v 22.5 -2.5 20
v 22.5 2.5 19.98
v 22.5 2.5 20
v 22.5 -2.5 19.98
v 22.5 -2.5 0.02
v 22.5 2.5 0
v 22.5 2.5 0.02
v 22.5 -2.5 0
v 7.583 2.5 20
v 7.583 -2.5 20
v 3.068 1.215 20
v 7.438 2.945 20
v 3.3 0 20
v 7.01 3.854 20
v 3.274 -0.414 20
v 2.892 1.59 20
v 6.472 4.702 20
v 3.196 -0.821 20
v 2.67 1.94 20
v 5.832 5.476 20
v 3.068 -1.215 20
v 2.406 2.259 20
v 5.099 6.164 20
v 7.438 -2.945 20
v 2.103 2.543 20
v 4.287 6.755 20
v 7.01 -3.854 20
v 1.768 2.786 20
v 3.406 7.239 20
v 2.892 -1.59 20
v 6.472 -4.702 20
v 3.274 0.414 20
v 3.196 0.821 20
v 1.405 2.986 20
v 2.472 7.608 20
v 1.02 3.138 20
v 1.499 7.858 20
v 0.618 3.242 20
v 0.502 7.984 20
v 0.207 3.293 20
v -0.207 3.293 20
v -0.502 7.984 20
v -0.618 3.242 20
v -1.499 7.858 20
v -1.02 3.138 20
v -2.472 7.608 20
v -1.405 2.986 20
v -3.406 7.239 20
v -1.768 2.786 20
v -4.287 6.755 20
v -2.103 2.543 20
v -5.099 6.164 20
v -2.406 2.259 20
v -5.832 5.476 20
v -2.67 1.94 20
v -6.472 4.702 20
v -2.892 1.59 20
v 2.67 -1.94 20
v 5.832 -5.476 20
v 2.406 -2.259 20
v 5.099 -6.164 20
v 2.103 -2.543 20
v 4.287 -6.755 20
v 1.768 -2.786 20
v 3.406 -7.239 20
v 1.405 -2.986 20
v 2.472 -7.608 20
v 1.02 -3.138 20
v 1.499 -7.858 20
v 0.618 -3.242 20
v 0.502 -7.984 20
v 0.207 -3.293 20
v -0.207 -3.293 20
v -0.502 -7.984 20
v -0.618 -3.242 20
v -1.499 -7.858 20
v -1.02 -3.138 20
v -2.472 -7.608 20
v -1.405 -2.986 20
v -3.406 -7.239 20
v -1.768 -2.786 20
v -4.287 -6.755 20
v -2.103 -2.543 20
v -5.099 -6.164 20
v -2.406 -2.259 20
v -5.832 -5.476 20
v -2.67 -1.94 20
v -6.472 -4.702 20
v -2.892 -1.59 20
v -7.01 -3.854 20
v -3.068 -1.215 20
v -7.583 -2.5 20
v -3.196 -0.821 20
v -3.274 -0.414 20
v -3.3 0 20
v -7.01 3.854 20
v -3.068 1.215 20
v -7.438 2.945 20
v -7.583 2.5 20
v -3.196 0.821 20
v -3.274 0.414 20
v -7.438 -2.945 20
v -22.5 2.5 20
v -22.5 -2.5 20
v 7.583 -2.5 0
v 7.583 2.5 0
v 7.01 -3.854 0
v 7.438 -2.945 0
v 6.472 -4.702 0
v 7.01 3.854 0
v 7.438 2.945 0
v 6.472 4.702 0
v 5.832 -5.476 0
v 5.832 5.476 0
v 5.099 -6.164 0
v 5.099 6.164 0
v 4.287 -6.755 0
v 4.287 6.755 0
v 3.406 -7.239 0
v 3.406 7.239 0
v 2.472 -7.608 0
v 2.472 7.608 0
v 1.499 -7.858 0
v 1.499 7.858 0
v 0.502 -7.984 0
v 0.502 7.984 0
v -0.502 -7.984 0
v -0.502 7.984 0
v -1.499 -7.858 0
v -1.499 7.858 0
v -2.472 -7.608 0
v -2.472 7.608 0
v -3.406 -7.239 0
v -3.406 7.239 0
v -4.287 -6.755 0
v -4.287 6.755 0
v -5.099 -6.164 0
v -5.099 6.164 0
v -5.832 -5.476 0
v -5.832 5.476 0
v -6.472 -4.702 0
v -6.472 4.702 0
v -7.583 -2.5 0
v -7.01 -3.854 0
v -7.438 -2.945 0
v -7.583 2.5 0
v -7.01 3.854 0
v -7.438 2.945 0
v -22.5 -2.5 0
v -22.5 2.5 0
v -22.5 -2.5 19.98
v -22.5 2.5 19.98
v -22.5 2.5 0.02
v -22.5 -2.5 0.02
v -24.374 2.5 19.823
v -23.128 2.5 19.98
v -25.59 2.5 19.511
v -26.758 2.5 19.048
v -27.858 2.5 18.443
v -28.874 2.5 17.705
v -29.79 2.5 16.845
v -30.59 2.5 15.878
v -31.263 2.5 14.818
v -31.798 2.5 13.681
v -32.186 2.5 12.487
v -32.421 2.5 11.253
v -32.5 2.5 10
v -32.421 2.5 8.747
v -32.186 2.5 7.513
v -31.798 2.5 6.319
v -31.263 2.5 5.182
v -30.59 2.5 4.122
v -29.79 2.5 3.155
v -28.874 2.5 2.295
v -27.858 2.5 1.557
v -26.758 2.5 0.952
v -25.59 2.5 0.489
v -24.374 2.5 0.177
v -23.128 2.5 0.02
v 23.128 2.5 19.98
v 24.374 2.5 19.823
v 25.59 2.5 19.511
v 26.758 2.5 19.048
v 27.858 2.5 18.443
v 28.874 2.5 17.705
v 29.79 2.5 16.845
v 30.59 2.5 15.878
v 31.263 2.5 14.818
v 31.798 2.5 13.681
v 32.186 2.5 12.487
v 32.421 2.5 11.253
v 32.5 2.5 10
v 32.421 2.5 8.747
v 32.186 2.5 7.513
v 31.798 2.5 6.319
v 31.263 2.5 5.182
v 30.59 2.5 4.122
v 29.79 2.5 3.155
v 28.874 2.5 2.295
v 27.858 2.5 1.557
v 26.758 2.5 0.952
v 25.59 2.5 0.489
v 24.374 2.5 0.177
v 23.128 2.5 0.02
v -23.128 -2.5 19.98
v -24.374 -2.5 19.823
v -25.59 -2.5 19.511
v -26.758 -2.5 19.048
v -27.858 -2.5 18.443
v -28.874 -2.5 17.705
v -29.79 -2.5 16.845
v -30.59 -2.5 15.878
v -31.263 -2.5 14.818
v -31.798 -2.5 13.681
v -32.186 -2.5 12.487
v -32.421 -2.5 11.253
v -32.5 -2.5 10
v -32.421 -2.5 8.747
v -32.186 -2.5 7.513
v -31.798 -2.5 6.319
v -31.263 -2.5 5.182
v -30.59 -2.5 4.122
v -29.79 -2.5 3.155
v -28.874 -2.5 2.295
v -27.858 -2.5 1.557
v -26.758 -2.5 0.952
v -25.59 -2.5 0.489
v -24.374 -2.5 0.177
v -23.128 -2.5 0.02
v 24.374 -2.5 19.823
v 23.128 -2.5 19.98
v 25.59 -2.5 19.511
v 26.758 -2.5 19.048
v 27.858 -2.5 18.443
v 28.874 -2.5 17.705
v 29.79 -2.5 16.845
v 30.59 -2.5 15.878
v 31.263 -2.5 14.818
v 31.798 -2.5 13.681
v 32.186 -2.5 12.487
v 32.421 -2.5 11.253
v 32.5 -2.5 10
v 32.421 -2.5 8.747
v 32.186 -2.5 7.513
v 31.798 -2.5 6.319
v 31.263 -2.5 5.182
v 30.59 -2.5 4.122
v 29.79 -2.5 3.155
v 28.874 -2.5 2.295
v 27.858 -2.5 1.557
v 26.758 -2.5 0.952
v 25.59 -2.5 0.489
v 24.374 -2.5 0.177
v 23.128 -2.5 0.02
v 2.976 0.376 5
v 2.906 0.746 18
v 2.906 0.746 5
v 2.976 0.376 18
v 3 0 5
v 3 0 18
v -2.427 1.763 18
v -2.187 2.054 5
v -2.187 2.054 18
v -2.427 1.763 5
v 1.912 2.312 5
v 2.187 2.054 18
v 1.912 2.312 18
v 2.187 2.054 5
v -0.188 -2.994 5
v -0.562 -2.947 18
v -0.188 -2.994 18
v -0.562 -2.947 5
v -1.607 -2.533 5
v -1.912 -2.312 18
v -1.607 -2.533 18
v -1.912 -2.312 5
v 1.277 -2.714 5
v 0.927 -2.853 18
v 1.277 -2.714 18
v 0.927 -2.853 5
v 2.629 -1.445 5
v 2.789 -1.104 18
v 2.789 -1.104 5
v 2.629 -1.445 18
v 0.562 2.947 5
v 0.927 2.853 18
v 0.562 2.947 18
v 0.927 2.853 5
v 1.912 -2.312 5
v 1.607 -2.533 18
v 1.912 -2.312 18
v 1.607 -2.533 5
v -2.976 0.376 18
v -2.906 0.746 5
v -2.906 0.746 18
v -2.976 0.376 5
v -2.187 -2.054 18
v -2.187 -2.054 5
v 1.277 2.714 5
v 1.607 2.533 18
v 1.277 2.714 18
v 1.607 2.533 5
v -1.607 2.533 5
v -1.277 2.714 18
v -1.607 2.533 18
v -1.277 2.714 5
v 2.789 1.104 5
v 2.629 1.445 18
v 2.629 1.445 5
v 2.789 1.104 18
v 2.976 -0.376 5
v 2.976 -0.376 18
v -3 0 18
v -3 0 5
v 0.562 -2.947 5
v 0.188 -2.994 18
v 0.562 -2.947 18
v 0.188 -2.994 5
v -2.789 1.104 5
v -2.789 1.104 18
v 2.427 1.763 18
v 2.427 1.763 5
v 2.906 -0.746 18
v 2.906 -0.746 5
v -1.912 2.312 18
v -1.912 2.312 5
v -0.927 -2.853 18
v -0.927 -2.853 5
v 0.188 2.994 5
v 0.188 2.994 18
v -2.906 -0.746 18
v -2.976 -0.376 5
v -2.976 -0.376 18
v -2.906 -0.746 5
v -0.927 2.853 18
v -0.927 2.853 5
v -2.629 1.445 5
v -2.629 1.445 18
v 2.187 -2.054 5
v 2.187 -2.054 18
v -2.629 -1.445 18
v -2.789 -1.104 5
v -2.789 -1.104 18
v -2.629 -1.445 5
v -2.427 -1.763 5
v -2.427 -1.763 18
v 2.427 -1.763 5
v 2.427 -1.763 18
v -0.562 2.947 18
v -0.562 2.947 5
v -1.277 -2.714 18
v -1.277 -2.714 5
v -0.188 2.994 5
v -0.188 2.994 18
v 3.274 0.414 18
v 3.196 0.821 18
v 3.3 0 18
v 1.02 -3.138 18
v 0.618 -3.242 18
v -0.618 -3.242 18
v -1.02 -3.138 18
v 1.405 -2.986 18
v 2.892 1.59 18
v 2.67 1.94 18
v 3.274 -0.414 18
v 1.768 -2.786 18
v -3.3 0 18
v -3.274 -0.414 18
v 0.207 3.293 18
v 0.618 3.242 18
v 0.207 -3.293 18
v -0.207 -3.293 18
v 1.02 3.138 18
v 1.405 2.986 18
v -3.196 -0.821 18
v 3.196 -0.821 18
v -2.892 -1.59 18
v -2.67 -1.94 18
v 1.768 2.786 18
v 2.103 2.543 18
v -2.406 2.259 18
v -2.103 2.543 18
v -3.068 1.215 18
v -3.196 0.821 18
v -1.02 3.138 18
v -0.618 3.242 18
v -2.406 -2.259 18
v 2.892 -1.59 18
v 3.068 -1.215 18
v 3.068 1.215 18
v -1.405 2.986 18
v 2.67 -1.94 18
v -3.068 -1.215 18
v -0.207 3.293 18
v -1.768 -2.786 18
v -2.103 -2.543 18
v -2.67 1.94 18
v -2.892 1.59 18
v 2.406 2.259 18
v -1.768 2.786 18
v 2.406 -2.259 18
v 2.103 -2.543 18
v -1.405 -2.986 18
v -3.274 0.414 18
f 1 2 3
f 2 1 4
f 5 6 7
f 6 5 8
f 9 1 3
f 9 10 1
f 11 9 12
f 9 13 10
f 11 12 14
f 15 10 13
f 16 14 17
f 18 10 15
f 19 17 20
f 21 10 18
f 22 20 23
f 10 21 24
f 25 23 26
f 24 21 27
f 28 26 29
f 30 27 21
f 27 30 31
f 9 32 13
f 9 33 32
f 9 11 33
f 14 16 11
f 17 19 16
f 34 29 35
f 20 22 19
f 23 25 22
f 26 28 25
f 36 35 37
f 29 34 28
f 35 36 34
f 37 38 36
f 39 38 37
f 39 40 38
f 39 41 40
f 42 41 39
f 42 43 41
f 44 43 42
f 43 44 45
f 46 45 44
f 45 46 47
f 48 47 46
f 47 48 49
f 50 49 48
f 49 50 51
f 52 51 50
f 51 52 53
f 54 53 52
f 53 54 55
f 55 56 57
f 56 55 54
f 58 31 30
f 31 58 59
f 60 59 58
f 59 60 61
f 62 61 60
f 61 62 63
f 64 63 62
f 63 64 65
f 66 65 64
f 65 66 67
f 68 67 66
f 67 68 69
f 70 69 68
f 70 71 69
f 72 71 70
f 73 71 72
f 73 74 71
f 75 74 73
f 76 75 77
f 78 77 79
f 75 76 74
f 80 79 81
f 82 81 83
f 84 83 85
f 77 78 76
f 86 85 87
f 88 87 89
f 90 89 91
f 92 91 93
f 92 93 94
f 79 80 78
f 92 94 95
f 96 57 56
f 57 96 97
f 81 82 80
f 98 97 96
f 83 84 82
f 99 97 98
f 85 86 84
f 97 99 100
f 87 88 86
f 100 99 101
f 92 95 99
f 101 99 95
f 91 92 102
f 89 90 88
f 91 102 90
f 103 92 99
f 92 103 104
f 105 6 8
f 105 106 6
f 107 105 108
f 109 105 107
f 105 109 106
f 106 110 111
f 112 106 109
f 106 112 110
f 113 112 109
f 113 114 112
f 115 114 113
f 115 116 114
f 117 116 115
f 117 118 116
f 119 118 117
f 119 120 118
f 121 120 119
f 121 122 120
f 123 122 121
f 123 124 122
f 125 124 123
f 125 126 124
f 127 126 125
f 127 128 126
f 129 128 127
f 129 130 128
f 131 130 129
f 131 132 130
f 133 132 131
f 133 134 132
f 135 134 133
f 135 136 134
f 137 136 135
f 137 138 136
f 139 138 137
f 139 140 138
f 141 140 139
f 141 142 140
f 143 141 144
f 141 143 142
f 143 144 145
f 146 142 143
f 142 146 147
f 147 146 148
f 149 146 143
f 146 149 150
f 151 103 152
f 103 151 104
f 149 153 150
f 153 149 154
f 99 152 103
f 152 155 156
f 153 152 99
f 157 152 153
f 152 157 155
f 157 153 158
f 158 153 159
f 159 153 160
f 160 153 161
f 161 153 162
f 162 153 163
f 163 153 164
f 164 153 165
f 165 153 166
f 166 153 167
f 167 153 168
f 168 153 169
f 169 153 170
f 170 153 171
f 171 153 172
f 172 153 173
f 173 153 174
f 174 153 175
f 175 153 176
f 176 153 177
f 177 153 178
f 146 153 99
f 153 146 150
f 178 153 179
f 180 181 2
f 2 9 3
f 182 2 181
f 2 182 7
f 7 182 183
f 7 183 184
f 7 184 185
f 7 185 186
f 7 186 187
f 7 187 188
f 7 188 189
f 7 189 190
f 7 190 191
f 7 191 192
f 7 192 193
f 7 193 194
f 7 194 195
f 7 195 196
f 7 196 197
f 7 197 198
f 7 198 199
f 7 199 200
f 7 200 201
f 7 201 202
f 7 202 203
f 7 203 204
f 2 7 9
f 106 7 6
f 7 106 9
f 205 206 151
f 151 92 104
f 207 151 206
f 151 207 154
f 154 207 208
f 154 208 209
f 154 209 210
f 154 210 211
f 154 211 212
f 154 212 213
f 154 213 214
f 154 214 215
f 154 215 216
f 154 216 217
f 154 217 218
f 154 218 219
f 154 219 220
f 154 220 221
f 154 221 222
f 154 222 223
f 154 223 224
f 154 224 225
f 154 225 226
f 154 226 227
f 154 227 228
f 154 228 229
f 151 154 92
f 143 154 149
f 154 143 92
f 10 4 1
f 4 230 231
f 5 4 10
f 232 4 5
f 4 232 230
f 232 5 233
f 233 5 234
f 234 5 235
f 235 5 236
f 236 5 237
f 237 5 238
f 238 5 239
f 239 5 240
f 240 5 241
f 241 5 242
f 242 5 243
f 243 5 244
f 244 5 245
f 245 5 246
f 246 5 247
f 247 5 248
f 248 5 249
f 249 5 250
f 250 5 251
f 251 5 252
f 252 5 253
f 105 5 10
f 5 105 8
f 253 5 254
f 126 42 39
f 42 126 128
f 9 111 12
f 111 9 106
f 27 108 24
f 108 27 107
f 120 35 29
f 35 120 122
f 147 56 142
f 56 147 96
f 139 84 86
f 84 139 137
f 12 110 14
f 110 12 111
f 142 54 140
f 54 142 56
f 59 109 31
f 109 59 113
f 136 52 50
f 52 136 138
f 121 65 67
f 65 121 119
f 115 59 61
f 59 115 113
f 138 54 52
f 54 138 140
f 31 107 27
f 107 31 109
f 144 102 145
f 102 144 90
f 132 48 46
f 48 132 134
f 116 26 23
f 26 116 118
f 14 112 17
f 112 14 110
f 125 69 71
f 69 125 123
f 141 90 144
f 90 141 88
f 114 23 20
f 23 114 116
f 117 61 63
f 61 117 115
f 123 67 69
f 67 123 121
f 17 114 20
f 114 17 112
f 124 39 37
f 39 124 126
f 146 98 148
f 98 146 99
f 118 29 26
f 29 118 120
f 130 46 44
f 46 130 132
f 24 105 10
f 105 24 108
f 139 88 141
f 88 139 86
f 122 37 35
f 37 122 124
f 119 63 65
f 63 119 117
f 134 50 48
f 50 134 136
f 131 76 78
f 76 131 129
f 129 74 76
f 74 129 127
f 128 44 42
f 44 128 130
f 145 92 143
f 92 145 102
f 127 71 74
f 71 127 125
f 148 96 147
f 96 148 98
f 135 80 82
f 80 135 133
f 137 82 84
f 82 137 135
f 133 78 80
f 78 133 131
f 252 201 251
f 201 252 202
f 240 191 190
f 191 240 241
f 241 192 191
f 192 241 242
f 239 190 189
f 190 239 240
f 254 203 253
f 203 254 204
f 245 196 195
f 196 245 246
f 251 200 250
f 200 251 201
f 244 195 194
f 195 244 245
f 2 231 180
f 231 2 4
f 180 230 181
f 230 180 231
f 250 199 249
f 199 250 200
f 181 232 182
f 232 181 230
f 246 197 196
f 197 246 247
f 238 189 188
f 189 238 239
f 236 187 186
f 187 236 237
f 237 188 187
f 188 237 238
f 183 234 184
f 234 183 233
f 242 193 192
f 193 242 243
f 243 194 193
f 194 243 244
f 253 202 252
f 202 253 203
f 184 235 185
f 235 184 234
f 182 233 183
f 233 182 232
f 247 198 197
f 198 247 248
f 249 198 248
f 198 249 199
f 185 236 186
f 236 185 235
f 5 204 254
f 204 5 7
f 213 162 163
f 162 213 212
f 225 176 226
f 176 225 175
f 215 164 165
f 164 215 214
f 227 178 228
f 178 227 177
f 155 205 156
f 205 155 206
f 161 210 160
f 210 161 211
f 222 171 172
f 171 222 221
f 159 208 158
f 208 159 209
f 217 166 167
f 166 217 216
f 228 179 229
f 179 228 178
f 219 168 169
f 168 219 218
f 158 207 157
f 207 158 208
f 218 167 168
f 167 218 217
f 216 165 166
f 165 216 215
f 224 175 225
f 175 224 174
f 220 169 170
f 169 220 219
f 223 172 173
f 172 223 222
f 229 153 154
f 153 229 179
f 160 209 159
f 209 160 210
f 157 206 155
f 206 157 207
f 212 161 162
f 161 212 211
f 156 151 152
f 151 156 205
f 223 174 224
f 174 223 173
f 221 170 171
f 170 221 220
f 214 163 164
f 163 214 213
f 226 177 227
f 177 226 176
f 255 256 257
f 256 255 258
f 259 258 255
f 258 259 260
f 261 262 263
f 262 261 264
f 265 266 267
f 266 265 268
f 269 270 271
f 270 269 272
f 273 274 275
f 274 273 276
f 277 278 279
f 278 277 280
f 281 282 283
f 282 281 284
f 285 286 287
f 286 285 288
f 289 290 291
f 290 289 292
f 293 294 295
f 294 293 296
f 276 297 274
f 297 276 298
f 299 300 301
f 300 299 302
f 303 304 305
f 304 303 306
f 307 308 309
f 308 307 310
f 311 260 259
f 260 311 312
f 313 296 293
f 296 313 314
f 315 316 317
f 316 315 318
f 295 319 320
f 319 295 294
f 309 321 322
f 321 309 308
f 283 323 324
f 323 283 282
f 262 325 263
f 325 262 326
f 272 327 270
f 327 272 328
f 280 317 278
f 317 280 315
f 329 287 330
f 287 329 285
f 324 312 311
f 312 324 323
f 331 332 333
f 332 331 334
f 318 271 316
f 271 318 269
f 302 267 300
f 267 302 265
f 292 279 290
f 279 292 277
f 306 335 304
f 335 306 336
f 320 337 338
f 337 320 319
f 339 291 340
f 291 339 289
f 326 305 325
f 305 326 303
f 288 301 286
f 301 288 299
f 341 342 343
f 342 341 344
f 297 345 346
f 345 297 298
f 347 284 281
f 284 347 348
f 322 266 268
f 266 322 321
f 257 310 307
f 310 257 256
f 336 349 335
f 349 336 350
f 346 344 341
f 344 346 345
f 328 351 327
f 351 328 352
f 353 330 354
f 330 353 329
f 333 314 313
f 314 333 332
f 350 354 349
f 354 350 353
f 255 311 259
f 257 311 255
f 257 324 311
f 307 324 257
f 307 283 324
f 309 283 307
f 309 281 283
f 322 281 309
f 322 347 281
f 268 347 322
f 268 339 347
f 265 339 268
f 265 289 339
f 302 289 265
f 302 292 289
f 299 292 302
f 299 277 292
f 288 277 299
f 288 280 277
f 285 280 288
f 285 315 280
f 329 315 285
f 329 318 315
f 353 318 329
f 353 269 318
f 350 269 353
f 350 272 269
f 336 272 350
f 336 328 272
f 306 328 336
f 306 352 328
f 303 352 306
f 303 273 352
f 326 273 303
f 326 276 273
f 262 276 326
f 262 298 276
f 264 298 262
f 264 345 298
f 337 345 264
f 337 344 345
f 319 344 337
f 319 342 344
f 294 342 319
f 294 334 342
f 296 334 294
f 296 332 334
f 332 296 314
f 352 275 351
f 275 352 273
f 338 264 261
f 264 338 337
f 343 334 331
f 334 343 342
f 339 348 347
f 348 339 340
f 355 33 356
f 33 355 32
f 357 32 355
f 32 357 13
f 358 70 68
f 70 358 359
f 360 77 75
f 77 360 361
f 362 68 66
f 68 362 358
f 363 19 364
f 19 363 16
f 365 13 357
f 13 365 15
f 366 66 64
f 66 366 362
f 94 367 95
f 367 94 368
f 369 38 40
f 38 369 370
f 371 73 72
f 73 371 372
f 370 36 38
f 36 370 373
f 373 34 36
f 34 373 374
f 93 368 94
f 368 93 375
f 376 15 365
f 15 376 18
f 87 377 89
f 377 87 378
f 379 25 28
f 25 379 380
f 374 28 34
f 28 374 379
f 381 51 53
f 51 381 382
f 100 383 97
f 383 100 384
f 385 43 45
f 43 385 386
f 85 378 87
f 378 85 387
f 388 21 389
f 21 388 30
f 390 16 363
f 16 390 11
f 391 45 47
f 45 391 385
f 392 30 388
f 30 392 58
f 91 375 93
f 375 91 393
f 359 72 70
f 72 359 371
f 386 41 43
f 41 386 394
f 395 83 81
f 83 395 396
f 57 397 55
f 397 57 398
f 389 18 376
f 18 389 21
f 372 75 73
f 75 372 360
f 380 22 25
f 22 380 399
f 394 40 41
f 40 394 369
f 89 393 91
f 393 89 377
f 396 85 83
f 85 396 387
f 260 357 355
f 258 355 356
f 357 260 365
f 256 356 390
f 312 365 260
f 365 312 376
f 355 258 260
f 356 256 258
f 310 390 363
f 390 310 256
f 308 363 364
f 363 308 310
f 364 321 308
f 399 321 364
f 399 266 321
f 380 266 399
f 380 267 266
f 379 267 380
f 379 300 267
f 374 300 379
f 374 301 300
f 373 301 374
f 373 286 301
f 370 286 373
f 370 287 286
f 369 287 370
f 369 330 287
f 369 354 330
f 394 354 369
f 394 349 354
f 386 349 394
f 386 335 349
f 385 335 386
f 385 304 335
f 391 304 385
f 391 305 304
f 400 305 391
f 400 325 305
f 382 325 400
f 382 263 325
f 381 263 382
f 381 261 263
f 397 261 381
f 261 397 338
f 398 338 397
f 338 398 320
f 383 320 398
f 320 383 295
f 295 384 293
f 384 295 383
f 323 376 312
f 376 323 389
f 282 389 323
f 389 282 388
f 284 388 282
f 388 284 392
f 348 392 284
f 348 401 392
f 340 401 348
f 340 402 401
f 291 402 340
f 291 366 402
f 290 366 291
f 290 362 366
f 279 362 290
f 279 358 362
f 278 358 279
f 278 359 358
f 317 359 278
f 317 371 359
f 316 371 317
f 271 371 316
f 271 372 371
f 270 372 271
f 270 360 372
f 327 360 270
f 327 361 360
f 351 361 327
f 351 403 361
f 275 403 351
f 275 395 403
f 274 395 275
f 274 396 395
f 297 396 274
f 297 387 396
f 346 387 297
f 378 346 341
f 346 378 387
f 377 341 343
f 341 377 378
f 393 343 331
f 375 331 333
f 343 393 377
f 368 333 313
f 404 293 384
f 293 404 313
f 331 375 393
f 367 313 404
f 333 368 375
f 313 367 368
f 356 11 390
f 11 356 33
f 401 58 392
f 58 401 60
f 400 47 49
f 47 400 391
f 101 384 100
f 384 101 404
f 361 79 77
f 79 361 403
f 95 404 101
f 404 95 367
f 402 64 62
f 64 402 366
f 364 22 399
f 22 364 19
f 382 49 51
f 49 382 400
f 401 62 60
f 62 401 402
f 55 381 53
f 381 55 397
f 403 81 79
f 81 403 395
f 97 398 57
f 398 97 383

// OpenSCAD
h = 20;
hi = 5;
ri = 3.0;
rit = 3.3;
hit = 2;
ra = 8;

$fn = 50; 

bc = 45;
dc = 5;

difference(){
	union(){
		translate([0,0,h/2])cube([bc,dc,h],center=true);
		cylinder(h=h,r=ra);
		translate([bc/2,0,h/2]) rotate([90,0,0]) cylinder(h=dc,r=h/2,center=true);
		translate([-bc/2,0,h/2]) rotate([90,0,0]) cylinder(h=dc,r=h/2,center=true);
	}
	translate([0,0,hi]) cylinder(h=h,r=ri);
	translate([0,0,h-hit]) cylinder(h=h,r=rit);
}
